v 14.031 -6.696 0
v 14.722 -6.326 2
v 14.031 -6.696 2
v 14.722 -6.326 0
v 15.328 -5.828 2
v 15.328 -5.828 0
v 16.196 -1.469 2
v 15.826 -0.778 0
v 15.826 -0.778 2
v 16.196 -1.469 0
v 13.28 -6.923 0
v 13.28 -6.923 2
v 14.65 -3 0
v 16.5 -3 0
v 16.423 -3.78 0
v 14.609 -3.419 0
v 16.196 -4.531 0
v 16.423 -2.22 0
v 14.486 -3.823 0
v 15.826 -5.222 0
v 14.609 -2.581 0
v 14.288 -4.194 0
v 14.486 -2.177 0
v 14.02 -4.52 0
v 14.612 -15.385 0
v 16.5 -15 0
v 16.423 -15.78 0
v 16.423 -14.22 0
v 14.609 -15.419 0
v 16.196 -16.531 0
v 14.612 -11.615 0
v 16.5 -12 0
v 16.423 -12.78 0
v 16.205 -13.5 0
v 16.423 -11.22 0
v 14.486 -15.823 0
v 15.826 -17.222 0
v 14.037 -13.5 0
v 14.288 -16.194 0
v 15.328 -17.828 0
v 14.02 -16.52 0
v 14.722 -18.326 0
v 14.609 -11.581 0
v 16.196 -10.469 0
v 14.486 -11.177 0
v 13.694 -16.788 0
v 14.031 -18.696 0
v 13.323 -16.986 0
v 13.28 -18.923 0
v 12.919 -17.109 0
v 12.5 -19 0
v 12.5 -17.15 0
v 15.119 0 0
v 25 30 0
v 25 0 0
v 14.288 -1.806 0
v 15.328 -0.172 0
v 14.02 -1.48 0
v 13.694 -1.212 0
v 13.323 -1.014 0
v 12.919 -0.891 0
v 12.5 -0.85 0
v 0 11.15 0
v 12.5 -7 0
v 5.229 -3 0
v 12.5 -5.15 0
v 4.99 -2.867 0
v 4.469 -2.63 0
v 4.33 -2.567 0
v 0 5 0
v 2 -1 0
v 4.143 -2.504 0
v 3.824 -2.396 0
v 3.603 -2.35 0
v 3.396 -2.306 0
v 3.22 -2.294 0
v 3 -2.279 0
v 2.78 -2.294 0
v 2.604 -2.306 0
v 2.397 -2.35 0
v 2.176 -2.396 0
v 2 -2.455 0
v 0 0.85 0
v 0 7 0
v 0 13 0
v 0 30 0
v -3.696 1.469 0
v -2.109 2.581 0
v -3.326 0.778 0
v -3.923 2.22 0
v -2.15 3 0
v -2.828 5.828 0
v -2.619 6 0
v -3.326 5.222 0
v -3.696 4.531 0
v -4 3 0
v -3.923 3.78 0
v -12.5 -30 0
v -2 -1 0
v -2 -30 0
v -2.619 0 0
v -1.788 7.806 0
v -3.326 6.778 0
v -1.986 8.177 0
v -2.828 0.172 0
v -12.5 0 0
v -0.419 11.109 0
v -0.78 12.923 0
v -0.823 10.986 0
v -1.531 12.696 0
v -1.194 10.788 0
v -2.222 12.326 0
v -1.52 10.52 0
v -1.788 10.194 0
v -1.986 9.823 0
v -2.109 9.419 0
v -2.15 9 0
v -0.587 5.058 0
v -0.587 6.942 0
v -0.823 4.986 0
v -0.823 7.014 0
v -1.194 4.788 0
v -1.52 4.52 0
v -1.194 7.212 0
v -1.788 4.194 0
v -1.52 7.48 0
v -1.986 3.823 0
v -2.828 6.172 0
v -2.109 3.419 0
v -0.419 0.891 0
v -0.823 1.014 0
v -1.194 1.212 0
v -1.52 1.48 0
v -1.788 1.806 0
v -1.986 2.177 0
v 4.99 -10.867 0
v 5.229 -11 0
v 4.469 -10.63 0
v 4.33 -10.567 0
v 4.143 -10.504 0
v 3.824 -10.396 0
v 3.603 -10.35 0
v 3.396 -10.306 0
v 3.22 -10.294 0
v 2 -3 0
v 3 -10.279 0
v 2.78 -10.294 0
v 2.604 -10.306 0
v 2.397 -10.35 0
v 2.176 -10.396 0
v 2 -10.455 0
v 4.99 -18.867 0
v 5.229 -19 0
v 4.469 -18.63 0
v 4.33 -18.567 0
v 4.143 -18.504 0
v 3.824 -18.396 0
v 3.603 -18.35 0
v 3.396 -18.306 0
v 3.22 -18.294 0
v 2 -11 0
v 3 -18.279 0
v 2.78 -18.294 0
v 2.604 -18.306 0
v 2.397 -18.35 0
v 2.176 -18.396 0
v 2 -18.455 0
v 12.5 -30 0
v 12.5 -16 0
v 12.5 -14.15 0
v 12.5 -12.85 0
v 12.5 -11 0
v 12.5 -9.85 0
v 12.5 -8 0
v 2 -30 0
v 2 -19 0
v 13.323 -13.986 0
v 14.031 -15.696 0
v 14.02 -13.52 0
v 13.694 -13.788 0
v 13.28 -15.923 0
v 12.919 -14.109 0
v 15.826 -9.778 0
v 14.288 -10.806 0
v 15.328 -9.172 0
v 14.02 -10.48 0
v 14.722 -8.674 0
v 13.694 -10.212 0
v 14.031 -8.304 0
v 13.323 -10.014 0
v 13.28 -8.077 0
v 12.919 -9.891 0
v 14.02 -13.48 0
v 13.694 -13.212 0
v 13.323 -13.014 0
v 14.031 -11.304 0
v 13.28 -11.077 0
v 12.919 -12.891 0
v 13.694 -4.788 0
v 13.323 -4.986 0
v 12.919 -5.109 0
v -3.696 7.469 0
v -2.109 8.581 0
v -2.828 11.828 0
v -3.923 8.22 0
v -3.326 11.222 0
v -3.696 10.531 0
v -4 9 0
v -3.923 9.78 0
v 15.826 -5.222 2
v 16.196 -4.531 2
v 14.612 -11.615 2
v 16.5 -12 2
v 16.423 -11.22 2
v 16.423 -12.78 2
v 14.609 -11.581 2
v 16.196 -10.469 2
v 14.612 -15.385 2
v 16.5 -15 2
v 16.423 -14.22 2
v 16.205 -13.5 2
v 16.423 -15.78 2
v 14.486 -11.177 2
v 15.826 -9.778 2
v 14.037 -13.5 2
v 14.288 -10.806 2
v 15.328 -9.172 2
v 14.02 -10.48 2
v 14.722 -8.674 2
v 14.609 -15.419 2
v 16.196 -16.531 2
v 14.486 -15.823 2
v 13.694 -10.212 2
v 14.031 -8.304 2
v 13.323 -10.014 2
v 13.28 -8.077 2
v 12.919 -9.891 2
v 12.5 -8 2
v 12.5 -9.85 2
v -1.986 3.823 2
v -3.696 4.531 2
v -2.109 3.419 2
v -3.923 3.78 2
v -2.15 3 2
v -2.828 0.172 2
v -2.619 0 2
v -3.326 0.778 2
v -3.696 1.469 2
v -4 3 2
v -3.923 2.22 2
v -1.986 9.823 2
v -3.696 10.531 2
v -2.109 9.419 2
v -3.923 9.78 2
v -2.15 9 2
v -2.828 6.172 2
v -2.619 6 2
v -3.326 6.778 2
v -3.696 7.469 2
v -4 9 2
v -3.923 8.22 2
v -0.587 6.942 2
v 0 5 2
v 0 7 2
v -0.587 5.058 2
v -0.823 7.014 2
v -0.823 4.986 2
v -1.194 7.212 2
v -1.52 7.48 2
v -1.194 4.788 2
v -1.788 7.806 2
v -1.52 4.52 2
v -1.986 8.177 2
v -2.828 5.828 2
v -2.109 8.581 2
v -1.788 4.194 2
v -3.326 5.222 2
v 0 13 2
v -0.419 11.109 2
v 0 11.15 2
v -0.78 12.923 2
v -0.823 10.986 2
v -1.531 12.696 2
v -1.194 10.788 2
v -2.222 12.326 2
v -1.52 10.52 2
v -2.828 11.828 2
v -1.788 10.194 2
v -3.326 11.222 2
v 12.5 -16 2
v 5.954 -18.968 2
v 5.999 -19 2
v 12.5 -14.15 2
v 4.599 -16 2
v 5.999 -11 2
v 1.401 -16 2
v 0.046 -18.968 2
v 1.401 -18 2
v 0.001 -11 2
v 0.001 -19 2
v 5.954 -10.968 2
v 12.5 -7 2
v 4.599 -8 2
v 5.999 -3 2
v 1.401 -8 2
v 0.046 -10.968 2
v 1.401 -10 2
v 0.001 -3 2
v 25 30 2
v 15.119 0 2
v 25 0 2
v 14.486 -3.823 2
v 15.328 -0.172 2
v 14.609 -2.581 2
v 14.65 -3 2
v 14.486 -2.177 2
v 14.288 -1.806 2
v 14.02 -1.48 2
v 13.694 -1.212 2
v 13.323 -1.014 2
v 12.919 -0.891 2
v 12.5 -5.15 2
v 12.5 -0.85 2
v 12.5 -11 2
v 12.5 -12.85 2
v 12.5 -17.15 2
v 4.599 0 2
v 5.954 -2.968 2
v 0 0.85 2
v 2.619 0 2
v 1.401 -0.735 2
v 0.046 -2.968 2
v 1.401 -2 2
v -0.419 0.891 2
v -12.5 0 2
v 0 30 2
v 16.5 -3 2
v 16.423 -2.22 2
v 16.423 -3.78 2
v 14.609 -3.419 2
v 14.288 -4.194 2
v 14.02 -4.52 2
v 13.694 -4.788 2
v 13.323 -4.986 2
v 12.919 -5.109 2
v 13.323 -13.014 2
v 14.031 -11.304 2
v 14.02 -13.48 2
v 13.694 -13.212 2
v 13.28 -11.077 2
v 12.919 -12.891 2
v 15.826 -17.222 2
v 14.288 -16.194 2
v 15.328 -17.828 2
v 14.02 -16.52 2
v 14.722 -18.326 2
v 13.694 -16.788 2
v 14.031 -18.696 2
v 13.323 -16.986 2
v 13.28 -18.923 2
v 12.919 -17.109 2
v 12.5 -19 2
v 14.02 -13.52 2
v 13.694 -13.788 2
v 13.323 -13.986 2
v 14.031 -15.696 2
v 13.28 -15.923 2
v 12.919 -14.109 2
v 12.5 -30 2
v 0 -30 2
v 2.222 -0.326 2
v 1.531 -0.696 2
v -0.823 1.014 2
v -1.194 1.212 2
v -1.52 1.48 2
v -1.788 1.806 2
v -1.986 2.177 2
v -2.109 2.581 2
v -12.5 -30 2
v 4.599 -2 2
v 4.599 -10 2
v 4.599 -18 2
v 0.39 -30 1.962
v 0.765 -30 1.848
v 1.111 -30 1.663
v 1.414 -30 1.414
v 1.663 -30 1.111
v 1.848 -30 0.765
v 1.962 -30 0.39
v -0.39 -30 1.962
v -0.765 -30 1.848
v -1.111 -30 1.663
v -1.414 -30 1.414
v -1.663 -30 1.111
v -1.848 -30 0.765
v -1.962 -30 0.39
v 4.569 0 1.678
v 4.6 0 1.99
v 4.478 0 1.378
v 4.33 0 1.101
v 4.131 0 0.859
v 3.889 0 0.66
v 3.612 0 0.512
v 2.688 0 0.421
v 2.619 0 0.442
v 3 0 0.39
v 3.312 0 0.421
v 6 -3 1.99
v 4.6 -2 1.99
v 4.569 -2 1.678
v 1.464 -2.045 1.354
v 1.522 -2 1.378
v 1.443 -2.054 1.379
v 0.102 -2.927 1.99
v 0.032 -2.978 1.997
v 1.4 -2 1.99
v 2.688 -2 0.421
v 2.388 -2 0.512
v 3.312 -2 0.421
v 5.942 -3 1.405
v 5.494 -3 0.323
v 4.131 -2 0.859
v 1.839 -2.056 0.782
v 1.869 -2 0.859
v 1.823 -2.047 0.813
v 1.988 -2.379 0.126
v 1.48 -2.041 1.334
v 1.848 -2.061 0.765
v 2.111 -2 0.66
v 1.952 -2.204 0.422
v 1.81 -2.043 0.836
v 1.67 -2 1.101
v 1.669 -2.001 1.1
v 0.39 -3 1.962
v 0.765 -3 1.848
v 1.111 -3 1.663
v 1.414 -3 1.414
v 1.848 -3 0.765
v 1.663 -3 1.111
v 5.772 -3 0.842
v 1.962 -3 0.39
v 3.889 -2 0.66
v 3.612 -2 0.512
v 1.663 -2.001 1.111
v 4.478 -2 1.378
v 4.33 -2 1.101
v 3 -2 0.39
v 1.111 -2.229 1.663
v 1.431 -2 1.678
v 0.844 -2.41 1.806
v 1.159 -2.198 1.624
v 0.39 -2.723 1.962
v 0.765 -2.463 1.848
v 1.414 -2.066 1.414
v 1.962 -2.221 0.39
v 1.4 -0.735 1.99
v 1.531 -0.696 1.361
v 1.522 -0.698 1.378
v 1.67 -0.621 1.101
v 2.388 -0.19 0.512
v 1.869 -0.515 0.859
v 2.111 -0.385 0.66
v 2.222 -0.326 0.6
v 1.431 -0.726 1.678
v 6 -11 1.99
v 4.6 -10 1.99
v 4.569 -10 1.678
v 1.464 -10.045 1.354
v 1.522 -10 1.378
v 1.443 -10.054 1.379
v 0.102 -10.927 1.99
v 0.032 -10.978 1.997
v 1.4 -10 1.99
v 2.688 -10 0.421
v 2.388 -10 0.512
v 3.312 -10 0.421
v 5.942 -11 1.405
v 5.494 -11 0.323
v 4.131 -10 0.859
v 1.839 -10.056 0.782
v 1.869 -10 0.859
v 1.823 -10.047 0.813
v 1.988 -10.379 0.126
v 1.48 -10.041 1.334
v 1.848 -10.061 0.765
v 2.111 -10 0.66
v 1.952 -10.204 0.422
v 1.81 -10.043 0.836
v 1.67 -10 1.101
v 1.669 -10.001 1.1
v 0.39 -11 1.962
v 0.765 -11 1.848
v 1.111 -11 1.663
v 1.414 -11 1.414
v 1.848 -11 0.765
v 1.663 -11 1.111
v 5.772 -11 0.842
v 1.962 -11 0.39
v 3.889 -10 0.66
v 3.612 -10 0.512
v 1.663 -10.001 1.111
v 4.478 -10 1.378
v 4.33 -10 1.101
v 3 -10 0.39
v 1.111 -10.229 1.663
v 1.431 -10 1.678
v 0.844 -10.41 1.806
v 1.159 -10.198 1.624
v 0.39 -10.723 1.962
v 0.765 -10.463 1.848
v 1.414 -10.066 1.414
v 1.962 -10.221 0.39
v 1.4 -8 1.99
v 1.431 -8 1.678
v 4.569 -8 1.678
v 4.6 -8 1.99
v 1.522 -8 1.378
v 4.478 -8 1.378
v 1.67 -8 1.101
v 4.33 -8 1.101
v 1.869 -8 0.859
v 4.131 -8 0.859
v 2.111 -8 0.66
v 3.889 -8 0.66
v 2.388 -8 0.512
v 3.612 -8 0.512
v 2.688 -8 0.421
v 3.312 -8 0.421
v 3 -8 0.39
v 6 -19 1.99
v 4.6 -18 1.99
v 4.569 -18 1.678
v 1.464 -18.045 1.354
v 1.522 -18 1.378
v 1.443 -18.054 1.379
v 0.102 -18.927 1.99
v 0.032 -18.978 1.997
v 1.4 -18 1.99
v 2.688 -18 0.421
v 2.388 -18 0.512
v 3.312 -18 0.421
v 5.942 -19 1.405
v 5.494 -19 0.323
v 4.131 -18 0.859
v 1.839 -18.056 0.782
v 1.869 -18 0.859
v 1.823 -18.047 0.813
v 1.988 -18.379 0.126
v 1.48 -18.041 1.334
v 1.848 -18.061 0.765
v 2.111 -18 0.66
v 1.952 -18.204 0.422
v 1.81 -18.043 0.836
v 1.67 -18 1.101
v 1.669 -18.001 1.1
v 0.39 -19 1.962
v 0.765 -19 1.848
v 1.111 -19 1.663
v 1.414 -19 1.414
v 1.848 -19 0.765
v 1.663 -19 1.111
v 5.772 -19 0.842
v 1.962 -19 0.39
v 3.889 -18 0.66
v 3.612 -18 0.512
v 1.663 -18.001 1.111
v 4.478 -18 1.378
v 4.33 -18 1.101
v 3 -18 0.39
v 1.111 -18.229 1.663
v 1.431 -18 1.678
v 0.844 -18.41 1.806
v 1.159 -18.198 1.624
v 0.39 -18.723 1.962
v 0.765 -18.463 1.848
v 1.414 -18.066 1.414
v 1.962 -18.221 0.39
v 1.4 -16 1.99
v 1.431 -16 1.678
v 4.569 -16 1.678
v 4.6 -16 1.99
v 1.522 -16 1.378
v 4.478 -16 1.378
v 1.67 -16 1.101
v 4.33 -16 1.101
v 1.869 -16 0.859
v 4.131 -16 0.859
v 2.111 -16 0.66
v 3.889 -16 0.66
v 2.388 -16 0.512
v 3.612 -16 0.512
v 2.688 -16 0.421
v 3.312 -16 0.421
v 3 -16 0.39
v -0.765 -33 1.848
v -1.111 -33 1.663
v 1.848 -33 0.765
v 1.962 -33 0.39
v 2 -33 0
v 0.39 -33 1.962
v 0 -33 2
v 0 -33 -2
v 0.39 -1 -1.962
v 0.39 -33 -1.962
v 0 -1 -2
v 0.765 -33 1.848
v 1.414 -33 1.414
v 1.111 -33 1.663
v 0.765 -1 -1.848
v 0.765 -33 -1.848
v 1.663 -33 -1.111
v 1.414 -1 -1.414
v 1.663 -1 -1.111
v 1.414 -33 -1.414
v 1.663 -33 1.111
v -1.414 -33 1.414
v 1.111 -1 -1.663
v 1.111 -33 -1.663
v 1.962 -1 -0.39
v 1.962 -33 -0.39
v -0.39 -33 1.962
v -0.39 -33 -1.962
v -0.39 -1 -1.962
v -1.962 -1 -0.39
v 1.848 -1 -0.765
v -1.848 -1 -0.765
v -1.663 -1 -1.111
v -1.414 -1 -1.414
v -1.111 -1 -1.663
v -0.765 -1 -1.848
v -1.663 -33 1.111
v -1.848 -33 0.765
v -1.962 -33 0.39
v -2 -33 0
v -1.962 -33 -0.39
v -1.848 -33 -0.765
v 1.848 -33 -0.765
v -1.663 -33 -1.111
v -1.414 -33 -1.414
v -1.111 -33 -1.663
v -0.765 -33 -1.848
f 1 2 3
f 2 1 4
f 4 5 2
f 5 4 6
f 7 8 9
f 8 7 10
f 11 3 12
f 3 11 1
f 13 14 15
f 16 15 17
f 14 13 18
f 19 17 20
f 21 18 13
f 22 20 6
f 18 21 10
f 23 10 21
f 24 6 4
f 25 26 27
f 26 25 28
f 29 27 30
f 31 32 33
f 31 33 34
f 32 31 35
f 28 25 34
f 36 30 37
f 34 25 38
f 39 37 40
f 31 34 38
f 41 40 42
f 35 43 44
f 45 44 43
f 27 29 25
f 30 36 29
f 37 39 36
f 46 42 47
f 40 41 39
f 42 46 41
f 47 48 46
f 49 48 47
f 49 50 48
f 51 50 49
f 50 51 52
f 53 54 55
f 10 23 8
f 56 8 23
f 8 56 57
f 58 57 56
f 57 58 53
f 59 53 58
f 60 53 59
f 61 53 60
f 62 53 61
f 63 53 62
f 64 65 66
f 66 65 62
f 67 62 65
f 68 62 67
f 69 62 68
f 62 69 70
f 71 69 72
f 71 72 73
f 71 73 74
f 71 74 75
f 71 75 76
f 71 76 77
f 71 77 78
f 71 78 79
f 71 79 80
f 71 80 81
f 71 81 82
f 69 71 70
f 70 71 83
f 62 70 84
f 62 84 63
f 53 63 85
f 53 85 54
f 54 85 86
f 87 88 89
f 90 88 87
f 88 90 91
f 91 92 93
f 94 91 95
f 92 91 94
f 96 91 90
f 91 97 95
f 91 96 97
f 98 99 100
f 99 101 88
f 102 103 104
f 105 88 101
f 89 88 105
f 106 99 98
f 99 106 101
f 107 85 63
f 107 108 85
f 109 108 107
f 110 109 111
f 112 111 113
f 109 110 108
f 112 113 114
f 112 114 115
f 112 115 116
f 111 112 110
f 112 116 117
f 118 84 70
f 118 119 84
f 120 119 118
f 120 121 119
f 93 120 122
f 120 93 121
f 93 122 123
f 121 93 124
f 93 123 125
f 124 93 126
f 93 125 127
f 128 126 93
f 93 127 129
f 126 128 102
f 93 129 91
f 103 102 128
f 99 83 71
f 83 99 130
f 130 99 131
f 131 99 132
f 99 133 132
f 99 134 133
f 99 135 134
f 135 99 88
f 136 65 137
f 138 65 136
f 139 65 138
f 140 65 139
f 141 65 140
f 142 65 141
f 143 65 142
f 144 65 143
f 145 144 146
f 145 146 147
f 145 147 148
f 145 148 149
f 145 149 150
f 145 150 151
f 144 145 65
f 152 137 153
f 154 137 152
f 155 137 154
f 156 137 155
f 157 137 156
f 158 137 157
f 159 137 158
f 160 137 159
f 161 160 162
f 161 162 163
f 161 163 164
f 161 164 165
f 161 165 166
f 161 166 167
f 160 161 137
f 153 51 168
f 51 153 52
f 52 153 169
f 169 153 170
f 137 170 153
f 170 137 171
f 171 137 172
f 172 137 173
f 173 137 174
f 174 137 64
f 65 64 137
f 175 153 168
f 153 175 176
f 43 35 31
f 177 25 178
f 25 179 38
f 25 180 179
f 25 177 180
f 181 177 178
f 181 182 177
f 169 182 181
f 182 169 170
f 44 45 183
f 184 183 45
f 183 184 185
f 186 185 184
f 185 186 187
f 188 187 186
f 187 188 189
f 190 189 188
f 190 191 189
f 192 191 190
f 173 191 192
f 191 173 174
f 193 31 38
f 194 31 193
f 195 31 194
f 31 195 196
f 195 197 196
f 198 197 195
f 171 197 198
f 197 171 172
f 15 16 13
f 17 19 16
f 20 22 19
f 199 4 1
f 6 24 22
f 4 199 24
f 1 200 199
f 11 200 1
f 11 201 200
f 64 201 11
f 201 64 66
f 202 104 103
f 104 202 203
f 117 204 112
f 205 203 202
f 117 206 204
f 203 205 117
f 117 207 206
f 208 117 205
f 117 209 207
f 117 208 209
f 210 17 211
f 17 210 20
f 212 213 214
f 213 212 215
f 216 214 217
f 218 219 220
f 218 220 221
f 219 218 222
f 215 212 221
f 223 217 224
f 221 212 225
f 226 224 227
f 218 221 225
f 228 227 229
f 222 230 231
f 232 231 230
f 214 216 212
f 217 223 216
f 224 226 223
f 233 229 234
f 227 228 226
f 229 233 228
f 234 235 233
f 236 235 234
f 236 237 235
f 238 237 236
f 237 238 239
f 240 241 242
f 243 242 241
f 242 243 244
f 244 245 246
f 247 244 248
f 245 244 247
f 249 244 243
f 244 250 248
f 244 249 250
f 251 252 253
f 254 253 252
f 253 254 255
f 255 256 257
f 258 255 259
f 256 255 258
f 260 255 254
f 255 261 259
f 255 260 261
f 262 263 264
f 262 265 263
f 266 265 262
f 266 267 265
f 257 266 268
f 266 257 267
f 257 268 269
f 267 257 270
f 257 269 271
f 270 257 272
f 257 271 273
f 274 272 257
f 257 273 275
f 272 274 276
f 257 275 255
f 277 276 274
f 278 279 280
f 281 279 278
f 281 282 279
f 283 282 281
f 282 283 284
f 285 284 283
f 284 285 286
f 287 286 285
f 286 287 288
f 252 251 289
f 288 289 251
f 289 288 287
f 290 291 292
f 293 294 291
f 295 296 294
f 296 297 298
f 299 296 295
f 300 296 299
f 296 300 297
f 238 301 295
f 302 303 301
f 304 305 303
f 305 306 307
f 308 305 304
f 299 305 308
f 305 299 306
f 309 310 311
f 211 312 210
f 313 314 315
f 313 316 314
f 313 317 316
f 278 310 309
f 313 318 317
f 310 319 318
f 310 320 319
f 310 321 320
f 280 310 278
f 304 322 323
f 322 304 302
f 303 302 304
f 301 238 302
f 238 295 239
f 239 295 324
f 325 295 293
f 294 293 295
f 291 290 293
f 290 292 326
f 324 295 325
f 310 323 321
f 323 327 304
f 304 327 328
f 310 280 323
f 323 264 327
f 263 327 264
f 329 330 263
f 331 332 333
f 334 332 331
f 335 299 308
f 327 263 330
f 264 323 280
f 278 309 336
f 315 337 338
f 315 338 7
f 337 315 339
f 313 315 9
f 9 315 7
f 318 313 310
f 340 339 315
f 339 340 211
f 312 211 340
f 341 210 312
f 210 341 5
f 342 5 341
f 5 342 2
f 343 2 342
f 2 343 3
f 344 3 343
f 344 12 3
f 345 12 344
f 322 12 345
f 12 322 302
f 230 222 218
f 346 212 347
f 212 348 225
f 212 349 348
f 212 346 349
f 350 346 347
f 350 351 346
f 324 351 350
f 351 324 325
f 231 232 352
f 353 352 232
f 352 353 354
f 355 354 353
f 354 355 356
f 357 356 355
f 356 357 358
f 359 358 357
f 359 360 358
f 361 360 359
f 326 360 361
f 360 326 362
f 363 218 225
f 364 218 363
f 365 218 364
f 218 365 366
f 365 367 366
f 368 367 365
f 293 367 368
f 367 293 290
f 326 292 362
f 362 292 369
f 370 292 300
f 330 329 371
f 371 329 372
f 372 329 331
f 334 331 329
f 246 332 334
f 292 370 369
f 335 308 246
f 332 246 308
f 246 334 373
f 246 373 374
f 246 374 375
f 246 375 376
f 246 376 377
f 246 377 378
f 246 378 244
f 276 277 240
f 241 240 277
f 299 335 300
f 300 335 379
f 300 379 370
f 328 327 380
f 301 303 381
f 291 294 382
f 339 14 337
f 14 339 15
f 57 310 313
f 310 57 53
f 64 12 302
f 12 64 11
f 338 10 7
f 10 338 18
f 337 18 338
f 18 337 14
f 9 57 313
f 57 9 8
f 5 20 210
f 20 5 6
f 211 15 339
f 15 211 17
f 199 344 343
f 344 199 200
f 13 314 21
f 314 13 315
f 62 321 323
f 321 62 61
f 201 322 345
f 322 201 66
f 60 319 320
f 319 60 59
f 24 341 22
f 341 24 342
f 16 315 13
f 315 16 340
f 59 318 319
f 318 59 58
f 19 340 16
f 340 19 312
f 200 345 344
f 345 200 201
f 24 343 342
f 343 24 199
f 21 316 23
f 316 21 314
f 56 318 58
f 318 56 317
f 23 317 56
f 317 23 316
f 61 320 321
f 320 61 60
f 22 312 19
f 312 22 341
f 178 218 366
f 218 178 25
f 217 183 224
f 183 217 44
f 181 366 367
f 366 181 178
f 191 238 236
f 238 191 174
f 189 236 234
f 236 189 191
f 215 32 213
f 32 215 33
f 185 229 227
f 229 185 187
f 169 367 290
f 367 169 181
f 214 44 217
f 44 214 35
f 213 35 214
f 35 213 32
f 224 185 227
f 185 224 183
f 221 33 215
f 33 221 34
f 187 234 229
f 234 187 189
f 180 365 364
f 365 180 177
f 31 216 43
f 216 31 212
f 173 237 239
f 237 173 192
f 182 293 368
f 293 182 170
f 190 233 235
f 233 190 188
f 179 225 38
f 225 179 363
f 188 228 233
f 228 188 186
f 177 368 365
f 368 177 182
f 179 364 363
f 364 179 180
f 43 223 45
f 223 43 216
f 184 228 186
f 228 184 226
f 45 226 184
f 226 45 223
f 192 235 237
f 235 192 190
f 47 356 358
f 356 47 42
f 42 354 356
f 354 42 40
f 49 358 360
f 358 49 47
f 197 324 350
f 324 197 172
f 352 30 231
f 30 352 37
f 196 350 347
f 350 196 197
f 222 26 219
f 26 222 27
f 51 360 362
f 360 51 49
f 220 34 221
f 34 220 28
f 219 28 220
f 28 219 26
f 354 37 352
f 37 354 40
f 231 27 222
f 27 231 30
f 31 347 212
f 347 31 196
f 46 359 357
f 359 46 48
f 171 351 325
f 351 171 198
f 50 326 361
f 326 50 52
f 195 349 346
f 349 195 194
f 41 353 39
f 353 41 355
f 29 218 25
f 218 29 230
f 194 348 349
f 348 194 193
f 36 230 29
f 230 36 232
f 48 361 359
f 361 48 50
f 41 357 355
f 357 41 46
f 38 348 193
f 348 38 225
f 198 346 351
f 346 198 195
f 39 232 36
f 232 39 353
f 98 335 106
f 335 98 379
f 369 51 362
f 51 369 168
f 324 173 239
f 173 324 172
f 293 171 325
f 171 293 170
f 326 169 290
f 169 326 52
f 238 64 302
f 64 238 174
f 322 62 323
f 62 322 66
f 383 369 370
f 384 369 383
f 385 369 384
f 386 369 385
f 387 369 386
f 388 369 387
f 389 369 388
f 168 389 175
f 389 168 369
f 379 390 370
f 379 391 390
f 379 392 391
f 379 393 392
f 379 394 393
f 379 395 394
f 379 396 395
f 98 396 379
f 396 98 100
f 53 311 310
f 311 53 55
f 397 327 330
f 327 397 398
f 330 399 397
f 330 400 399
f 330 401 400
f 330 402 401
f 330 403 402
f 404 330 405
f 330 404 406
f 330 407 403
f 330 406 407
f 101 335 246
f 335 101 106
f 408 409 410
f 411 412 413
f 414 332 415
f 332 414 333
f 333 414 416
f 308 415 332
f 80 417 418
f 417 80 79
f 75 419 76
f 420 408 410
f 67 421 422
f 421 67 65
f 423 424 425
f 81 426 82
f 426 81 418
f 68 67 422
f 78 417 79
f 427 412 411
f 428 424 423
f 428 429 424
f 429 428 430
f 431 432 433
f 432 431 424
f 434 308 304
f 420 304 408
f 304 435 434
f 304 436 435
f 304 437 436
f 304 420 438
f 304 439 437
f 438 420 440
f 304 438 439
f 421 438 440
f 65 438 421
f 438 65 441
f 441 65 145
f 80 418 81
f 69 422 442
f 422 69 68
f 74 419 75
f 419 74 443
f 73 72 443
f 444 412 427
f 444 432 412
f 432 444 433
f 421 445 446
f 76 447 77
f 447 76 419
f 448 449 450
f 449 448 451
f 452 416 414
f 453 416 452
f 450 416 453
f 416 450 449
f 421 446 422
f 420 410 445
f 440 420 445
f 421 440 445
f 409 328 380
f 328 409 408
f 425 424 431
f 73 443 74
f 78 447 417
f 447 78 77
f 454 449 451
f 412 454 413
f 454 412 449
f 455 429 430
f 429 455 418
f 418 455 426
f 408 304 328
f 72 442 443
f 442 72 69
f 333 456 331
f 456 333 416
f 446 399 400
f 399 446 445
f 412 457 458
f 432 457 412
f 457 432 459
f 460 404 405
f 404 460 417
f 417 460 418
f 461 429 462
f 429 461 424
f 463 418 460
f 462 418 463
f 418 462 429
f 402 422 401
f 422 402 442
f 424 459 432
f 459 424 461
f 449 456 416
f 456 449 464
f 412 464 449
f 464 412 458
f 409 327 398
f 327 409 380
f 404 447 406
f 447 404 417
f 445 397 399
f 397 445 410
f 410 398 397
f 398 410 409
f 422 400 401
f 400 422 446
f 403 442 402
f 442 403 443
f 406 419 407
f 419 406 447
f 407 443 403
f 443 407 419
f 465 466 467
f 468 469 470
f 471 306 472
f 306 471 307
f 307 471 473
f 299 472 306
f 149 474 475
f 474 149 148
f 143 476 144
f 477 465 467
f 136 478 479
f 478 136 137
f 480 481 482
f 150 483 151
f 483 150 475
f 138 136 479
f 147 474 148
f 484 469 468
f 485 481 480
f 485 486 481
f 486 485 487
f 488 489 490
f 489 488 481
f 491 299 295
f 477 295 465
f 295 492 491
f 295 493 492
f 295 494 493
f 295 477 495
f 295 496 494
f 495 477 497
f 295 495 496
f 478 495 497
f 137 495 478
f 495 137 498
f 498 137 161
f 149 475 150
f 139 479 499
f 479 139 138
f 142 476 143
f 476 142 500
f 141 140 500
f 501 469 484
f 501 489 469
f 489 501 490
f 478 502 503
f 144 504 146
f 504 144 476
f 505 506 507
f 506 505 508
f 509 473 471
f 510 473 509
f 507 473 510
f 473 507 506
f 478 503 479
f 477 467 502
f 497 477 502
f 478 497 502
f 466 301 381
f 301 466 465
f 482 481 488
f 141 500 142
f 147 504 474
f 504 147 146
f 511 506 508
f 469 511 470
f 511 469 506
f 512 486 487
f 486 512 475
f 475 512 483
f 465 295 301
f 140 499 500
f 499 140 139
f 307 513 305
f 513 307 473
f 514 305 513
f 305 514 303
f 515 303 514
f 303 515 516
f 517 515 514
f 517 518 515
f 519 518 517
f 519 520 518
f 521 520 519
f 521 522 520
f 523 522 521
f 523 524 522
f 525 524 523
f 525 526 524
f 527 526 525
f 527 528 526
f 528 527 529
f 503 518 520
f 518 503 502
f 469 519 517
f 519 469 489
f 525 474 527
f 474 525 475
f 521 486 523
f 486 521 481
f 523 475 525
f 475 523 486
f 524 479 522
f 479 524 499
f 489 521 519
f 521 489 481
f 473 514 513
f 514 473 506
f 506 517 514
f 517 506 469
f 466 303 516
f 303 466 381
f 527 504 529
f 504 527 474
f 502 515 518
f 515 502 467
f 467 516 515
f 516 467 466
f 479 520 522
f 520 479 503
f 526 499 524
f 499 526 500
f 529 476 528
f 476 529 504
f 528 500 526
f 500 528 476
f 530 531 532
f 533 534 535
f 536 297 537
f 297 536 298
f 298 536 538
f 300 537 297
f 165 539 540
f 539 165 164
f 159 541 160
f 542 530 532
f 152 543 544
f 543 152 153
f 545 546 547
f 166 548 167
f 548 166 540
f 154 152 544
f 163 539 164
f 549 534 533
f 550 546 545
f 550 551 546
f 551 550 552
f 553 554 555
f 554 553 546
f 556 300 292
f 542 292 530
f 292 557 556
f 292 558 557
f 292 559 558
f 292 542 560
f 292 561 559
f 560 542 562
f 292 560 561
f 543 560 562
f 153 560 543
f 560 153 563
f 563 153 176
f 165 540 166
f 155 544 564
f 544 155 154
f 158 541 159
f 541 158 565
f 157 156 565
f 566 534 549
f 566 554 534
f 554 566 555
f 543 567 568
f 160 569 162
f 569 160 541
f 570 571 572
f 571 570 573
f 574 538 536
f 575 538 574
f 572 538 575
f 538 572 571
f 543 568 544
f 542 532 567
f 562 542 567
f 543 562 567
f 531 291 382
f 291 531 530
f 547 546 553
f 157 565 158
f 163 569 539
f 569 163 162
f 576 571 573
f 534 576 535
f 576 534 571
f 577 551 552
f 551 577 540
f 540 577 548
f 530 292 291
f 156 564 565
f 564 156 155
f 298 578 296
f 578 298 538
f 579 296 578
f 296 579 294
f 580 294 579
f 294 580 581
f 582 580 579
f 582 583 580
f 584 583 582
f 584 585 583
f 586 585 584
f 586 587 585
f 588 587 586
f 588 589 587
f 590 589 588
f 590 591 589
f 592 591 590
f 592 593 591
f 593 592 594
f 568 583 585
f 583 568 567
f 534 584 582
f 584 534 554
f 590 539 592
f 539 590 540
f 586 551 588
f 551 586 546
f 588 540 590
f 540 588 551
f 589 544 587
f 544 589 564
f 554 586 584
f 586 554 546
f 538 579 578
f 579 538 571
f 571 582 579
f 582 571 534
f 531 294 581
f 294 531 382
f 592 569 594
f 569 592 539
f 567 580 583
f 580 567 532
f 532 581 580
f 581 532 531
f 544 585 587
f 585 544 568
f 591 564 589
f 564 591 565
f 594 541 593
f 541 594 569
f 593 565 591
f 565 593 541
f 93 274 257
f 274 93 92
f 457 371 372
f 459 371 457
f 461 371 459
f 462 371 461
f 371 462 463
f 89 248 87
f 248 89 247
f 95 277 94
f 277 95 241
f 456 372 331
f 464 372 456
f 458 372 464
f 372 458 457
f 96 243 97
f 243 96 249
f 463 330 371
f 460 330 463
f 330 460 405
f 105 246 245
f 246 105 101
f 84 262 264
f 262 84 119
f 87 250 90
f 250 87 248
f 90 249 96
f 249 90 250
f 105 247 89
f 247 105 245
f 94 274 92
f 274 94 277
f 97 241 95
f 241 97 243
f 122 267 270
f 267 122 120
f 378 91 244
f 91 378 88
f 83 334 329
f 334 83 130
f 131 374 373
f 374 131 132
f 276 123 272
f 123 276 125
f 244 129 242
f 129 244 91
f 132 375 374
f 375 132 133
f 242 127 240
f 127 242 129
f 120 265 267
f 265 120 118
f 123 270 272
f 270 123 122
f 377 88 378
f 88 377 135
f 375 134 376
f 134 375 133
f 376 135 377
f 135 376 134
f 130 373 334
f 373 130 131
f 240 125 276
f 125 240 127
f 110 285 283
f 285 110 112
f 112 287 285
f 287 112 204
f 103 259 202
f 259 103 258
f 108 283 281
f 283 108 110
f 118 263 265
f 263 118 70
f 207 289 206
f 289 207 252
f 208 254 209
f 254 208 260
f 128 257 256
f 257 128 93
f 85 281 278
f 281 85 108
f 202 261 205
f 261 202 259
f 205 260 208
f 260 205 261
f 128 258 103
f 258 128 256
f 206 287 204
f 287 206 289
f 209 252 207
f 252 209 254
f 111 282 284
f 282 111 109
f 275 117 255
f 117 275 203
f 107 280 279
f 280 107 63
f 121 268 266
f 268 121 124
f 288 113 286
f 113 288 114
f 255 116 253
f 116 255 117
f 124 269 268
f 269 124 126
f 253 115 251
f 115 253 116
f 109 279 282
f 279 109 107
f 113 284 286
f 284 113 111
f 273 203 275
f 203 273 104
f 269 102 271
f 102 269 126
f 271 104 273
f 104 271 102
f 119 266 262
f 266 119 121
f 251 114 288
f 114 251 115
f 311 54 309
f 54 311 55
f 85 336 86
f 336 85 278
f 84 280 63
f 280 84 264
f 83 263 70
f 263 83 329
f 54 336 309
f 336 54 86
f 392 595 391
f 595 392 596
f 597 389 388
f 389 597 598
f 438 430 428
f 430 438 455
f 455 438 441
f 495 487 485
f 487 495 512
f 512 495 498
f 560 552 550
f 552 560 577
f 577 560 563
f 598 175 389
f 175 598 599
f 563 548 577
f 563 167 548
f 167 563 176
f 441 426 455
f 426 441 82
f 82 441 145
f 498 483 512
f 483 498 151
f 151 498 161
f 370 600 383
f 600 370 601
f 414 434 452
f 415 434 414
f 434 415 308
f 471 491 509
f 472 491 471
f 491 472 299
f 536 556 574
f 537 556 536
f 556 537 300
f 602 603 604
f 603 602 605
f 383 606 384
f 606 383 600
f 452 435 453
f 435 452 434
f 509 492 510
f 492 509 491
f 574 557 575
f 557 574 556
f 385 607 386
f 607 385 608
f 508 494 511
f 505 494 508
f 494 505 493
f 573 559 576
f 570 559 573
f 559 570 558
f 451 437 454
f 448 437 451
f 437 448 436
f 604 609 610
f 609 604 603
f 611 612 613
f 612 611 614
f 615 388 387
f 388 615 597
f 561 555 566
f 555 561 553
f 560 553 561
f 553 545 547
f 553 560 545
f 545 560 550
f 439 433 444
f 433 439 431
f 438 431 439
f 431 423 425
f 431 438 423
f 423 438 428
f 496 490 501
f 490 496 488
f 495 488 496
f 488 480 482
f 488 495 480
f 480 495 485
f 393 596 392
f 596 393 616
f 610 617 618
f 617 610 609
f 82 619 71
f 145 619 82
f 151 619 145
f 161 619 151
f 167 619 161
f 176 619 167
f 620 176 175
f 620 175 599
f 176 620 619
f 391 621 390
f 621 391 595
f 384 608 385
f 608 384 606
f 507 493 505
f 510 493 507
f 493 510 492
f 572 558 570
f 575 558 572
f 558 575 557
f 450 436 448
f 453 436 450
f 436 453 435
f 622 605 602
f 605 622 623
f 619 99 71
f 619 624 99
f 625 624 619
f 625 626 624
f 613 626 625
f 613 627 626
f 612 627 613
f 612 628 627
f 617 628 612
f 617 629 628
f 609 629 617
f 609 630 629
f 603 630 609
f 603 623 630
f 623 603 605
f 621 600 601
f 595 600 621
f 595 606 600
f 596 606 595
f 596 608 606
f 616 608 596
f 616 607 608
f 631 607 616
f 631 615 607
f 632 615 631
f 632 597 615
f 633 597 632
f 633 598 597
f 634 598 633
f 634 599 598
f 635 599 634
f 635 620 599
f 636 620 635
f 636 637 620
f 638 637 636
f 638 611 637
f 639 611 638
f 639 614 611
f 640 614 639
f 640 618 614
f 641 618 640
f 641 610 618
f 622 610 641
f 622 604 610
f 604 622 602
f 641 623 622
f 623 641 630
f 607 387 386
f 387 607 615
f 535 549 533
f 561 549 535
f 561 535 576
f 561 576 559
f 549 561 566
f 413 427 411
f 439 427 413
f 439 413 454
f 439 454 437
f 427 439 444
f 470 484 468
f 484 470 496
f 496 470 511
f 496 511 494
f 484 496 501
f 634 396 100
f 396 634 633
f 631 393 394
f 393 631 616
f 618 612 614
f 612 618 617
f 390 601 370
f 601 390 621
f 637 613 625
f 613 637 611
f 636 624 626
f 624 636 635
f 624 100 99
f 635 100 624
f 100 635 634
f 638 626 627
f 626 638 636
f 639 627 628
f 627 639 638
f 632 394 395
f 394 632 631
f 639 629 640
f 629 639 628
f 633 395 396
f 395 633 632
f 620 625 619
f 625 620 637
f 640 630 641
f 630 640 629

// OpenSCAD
// Parameters
leaf_width = 25;
leaf_height = 30;
leaf_thickness = 2;
pin_diameter = 4;
pin_length = 32;
knuckle_outer_diameter = 8;
knuckle_inner_diameter = pin_diameter + 0.3;
knuckle_height = 6;
knuckle_count_left = 3;
knuckle_count_right = 2;
m3_countersink_diameter = 6;
m3_countersink_depth = 1;
m3_hole_diameter = 3.2;
m3_hole_spacing = 8;

// Derived parameters
knuckle_radius = knuckle_outer_diameter / 2;
knuckle_inner_radius = knuckle_inner_diameter / 2;
pin_radius = pin_diameter / 2;
leaf_half_width = leaf_width / 2;

// Function to create a single knuckle
module knuckle(position_y, is_left) {
    translate([0, position_y, 0]) {
        difference() {
            cylinder(h = leaf_thickness, r = knuckle_radius, $fn = 32);
            // Inner hole for the pin
            cylinder(h = leaf_thickness + 0.1, r = knuckle_inner_radius, $fn = 32);
        }
    }
}

// Left leaf
module left_leaf() {
    translate([-leaf_half_width, 0, 0]) {
        difference() {
            union() {
                // Main leaf plate
                cube([leaf_width, leaf_height, leaf_thickness]);

                // Knuckles for the left side
                for (i = [0 : knuckle_count_left - 1]) {
                    // Position knuckles to alternate with right side
                    knuckle_y_pos = i * knuckle_height + (knuckle_height / 2) * (i % 2 == 0 ? 0 : 1);
                    if (i == 0) { // Outer knuckle
                        knuckle(knuckle_y_pos + knuckle_height/2, true);
                    } else if (i == 1) { // Middle knuckle
                        knuckle(knuckle_y_pos + knuckle_height/2, true);
                    } else { // Another outer knuckle
                        knuckle(knuckle_y_pos + knuckle_height/2, true);
                    }
                }
            }

            // M3 countersink holes
            for (i = [0 : 2]) {
                hole_y = i * m3_hole_spacing;
                translate([leaf_half_width - 3, hole_y + 3, leaf_thickness - 0.01]) {
                    rotate([90, 0, 0]) {
                        // Countersink cone
                        cylinder(h = m3_countersink_depth, r1 = m3_countersink_diameter / 2, r2 = m3_hole_diameter / 2, $fn = 32);
                        // Through hole
                        translate([0, 0, m3_countersink_depth])
                        cylinder(h = leaf_thickness, r = m3_hole_diameter / 2, $fn = 32);
                    }
                }
            }
        }
    }
}

// Right leaf
module right_leaf() {
    translate([0, 0, 0]) { // Right leaf is centered at X=0
        difference() {
            union() {
                // Main leaf plate
                cube([leaf_width, leaf_height, leaf_thickness]);

                // Knuckles for the right side
                for (i = [0 : knuckle_count_right - 1]) {
                    // Position knuckles to alternate with left side
                    knuckle_y_pos = (i * knuckle_height) + (knuckle_height/2); // Intermediate positions
                    knuckle(knuckle_y_pos, false);
                }
            }

            // M3 countersink holes
            for (i = [0 : 2]) {
                hole_y = i * m3_hole_spacing;
                translate([-leaf_half_width + 3, hole_y + 3, leaf_thickness - 0.01]) {
                    rotate([90, 0, 0]) {
                        // Countersink cone
                        cylinder(h = m3_countersink_depth, r1 = m3_countersink_diameter / 2, r2 = m3_hole_diameter / 2, $fn = 32);
                        // Through hole
                        translate([0, 0, m3_countersink_depth])
                        cylinder(h = leaf_thickness, r = m3_hole_diameter / 2, $fn = 32);
                    }
                }
            }
        }
    }
}

// Pin
module pin() {
    cylinder(h = pin_length, r = pin_radius, $fn = 32);
}

// Assembly - 180 degree open state
module hinge_assembly() {
    // Left leaf (rotated 180 degrees around Z axis)
    rotate([0, 0, 180]) {
        left_leaf();
    }

    // Right leaf
    right_leaf();

    // Pin - centered and extended
    translate([0, -pin_length / 2 + leaf_height / 2, 0]) {
        rotate([90, 0, 0]) { // Rotate to align with Y axis
            pin();
        }
    }
}

hinge_assembly();
